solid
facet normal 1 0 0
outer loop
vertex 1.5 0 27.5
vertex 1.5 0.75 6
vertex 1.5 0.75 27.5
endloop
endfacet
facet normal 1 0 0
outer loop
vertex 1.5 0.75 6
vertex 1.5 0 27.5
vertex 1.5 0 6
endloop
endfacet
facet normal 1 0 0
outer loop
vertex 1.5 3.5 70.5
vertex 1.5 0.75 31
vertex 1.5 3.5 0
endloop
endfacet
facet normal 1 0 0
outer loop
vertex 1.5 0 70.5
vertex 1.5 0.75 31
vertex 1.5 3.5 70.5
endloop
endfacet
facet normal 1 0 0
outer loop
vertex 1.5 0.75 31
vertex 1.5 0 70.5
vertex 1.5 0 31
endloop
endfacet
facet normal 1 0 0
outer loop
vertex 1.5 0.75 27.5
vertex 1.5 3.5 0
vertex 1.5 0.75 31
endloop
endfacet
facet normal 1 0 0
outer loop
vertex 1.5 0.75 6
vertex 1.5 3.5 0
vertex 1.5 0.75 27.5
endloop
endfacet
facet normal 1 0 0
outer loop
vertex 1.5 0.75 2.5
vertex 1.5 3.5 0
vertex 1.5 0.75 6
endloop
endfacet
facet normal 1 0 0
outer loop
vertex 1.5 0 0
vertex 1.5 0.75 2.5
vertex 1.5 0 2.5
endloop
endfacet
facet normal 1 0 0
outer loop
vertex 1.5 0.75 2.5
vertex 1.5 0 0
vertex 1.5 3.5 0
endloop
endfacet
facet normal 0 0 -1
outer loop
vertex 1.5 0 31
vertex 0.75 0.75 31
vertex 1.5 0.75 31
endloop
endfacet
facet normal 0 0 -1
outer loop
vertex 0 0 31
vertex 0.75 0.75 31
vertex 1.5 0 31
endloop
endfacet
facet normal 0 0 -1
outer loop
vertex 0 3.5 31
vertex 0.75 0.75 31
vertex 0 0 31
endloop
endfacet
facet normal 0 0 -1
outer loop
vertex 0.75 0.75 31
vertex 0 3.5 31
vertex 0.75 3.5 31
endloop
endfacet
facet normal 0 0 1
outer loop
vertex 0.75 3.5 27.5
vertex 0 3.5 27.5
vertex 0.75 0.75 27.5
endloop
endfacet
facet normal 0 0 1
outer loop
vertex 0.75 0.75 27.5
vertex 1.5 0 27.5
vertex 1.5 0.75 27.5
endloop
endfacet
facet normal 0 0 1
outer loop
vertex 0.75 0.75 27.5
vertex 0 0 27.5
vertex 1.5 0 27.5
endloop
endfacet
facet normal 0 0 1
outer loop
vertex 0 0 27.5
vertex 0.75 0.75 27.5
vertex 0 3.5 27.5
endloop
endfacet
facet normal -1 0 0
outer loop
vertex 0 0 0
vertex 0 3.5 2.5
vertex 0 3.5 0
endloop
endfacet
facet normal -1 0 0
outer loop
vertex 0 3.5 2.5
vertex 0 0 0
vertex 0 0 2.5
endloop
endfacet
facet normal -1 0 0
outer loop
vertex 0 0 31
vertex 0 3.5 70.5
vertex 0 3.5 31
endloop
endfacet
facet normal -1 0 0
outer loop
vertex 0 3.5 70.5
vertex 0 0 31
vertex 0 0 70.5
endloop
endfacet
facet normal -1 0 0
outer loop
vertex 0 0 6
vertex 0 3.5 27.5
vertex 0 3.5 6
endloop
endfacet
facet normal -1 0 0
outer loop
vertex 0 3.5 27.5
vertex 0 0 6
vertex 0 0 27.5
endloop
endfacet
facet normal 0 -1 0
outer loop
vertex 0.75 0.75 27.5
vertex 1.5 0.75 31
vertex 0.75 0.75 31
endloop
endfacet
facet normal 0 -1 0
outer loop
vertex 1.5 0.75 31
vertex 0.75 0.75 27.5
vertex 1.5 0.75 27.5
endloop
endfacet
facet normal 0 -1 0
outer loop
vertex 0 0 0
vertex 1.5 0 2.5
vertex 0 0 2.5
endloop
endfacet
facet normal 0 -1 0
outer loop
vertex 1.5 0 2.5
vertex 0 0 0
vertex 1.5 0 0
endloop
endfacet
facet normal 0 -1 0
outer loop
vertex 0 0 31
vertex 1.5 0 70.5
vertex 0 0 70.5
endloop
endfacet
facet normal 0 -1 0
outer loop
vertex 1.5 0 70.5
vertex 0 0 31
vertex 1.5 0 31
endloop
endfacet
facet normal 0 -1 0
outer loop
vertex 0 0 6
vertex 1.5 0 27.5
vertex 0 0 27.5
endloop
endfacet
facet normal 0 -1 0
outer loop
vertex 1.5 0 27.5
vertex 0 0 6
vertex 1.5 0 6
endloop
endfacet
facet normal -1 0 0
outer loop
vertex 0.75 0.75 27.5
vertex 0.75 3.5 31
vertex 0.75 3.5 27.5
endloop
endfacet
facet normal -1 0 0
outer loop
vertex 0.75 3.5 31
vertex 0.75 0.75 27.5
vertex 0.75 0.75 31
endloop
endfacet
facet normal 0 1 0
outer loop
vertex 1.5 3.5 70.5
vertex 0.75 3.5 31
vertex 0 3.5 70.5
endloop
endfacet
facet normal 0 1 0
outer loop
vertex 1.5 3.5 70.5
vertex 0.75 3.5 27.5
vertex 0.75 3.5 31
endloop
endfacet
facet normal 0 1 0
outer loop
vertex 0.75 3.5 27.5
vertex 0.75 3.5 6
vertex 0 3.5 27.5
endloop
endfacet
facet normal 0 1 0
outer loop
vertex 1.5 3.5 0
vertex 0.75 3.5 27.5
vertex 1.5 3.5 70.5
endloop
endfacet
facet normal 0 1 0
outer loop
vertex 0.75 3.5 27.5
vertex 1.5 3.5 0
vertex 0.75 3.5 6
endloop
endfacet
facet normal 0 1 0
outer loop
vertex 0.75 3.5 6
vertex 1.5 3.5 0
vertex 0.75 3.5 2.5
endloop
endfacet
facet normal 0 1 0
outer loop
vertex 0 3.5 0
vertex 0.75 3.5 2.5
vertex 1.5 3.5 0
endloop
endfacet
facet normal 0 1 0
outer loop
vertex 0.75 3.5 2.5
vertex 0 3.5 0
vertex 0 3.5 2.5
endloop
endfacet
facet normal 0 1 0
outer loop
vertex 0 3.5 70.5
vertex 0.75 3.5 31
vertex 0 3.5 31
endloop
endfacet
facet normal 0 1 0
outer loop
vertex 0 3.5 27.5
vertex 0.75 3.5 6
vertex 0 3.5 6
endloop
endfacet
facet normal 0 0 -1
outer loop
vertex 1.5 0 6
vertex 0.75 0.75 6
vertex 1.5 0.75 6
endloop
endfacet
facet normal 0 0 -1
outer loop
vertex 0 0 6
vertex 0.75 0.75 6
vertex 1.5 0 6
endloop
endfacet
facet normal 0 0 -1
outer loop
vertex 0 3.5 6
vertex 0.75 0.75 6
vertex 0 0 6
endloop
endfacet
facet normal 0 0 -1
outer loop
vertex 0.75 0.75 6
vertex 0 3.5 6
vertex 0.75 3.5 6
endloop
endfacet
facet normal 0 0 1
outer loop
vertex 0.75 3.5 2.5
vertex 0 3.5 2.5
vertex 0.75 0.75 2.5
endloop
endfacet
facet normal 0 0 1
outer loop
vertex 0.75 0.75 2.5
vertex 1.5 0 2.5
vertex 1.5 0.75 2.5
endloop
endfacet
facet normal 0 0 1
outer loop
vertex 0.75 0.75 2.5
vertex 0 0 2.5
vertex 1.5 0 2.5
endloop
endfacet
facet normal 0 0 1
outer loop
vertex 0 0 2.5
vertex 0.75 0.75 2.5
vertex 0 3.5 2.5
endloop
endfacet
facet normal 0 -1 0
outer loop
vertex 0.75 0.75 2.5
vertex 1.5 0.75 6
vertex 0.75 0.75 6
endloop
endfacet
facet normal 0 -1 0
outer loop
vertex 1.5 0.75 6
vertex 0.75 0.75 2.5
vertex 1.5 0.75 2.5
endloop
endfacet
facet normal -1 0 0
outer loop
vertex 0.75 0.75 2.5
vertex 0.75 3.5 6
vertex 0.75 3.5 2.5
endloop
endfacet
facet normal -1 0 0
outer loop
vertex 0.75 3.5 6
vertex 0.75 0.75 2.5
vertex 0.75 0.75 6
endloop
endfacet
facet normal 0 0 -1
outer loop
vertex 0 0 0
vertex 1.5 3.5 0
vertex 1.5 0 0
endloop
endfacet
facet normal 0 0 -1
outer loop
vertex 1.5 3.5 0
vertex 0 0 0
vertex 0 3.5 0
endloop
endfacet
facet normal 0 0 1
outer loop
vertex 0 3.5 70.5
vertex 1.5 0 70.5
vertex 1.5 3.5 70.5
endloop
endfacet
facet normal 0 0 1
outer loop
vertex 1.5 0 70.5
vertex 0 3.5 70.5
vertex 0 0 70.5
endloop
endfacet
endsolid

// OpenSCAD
// file: ../config.scad
// height of desktop and shelves
desktop_shelf_color="Sienna";
desktop_height=31;
desktop_thickness=0.75;
table_width=96;
table_depth=36;
shelf_thickness=0.5;
shelf_height=6;
top_shelf_height=72.5;
hutch_shelf_height=50;
left_lower_shelf_height=22;
left_lower_shelf_thickness=0.25;

// Legs
front_leg_length=desktop_height;
rear_leg_length=top_shelf_height-shelf_thickness;
leg_timber_width=1.5;
leg_timber_depth=3.5;
center_leg_timber_width=1.5;
center_leg_timber_depth=3.5;
center_leg_setback=24;

// Parts Shelves
parts_shelf_thickness = 0.35;
parts_shelf_spacing = 0.15;
parts_plate_thickness = 0.2;
parts_support_depth = 0.25;
parts_shelf_depth = 11;
parts_support_height = 11;
parts_shelf_width = (table_width/4)-(center_leg_timber_width*2)-(parts_plate_thickness*2);

// Plates
strut_timber_depth=1.5;
strut_timber_height=3.5;
top_shelf_timber_depth=3.5;
top_shelf_timber_height=1.5;
// file: ../components/leg_NOTcenter_NOTinner_left.scad
module leg_NOTcenter_NOTinner_left()
{
    include <../config.scad>
    leg_length = rear_leg_length;
    echo(str("BOM ITEM: leg_NOTcenter_NOTinner_left"));
    render() { // see note in README about rendering
        difference() {
            cube([leg_timber_width,leg_timber_depth,leg_length],false);

            // Top rabbets
            translate([0,0,desktop_height-strut_timber_height])
            {
                // rabbet cut on short side
                translate([0,(leg_timber_width-strut_timber_depth),0]){
                    cube([leg_timber_width,strut_timber_depth/2,strut_timber_height],false);
                }
                cube([strut_timber_depth/2,leg_timber_depth,strut_timber_height],false);
            }

            // Bottom rabbets
            translate([0,0,shelf_height-strut_timber_height])
            {
                // rabbet cut on short side
                translate([0,(leg_timber_width-strut_timber_depth),0]){
                    cube([leg_timber_width,strut_timber_depth/2,strut_timber_height],false);
                }
                cube([strut_timber_depth/2,leg_timber_depth,strut_timber_height],false);
            }

            // rear and center legs only
            if(top_shelf_timber_height >= top_shelf_timber_depth) {
              // Upper shelf rabbets for back/middle legs
              translate([0,0,leg_length-top_shelf_timber_height]){
                cube([top_shelf_timber_depth/2,leg_timber_depth,top_shelf_timber_height],false);
                cube([leg_timber_width,top_shelf_timber_depth/2,top_shelf_timber_height],false);
              }
            } else {
              // Upper shelf rabbets for back/middle legs
              translate([0,0,leg_length-top_shelf_timber_height]){
                cube([leg_timber_width,leg_timber_depth,top_shelf_timber_height],false);
              }
            }
        }
    }
}
// main file
use <../components/leg_NOTcenter_NOTinner_left.scad>

leg_NOTcenter_NOTinner_left();
